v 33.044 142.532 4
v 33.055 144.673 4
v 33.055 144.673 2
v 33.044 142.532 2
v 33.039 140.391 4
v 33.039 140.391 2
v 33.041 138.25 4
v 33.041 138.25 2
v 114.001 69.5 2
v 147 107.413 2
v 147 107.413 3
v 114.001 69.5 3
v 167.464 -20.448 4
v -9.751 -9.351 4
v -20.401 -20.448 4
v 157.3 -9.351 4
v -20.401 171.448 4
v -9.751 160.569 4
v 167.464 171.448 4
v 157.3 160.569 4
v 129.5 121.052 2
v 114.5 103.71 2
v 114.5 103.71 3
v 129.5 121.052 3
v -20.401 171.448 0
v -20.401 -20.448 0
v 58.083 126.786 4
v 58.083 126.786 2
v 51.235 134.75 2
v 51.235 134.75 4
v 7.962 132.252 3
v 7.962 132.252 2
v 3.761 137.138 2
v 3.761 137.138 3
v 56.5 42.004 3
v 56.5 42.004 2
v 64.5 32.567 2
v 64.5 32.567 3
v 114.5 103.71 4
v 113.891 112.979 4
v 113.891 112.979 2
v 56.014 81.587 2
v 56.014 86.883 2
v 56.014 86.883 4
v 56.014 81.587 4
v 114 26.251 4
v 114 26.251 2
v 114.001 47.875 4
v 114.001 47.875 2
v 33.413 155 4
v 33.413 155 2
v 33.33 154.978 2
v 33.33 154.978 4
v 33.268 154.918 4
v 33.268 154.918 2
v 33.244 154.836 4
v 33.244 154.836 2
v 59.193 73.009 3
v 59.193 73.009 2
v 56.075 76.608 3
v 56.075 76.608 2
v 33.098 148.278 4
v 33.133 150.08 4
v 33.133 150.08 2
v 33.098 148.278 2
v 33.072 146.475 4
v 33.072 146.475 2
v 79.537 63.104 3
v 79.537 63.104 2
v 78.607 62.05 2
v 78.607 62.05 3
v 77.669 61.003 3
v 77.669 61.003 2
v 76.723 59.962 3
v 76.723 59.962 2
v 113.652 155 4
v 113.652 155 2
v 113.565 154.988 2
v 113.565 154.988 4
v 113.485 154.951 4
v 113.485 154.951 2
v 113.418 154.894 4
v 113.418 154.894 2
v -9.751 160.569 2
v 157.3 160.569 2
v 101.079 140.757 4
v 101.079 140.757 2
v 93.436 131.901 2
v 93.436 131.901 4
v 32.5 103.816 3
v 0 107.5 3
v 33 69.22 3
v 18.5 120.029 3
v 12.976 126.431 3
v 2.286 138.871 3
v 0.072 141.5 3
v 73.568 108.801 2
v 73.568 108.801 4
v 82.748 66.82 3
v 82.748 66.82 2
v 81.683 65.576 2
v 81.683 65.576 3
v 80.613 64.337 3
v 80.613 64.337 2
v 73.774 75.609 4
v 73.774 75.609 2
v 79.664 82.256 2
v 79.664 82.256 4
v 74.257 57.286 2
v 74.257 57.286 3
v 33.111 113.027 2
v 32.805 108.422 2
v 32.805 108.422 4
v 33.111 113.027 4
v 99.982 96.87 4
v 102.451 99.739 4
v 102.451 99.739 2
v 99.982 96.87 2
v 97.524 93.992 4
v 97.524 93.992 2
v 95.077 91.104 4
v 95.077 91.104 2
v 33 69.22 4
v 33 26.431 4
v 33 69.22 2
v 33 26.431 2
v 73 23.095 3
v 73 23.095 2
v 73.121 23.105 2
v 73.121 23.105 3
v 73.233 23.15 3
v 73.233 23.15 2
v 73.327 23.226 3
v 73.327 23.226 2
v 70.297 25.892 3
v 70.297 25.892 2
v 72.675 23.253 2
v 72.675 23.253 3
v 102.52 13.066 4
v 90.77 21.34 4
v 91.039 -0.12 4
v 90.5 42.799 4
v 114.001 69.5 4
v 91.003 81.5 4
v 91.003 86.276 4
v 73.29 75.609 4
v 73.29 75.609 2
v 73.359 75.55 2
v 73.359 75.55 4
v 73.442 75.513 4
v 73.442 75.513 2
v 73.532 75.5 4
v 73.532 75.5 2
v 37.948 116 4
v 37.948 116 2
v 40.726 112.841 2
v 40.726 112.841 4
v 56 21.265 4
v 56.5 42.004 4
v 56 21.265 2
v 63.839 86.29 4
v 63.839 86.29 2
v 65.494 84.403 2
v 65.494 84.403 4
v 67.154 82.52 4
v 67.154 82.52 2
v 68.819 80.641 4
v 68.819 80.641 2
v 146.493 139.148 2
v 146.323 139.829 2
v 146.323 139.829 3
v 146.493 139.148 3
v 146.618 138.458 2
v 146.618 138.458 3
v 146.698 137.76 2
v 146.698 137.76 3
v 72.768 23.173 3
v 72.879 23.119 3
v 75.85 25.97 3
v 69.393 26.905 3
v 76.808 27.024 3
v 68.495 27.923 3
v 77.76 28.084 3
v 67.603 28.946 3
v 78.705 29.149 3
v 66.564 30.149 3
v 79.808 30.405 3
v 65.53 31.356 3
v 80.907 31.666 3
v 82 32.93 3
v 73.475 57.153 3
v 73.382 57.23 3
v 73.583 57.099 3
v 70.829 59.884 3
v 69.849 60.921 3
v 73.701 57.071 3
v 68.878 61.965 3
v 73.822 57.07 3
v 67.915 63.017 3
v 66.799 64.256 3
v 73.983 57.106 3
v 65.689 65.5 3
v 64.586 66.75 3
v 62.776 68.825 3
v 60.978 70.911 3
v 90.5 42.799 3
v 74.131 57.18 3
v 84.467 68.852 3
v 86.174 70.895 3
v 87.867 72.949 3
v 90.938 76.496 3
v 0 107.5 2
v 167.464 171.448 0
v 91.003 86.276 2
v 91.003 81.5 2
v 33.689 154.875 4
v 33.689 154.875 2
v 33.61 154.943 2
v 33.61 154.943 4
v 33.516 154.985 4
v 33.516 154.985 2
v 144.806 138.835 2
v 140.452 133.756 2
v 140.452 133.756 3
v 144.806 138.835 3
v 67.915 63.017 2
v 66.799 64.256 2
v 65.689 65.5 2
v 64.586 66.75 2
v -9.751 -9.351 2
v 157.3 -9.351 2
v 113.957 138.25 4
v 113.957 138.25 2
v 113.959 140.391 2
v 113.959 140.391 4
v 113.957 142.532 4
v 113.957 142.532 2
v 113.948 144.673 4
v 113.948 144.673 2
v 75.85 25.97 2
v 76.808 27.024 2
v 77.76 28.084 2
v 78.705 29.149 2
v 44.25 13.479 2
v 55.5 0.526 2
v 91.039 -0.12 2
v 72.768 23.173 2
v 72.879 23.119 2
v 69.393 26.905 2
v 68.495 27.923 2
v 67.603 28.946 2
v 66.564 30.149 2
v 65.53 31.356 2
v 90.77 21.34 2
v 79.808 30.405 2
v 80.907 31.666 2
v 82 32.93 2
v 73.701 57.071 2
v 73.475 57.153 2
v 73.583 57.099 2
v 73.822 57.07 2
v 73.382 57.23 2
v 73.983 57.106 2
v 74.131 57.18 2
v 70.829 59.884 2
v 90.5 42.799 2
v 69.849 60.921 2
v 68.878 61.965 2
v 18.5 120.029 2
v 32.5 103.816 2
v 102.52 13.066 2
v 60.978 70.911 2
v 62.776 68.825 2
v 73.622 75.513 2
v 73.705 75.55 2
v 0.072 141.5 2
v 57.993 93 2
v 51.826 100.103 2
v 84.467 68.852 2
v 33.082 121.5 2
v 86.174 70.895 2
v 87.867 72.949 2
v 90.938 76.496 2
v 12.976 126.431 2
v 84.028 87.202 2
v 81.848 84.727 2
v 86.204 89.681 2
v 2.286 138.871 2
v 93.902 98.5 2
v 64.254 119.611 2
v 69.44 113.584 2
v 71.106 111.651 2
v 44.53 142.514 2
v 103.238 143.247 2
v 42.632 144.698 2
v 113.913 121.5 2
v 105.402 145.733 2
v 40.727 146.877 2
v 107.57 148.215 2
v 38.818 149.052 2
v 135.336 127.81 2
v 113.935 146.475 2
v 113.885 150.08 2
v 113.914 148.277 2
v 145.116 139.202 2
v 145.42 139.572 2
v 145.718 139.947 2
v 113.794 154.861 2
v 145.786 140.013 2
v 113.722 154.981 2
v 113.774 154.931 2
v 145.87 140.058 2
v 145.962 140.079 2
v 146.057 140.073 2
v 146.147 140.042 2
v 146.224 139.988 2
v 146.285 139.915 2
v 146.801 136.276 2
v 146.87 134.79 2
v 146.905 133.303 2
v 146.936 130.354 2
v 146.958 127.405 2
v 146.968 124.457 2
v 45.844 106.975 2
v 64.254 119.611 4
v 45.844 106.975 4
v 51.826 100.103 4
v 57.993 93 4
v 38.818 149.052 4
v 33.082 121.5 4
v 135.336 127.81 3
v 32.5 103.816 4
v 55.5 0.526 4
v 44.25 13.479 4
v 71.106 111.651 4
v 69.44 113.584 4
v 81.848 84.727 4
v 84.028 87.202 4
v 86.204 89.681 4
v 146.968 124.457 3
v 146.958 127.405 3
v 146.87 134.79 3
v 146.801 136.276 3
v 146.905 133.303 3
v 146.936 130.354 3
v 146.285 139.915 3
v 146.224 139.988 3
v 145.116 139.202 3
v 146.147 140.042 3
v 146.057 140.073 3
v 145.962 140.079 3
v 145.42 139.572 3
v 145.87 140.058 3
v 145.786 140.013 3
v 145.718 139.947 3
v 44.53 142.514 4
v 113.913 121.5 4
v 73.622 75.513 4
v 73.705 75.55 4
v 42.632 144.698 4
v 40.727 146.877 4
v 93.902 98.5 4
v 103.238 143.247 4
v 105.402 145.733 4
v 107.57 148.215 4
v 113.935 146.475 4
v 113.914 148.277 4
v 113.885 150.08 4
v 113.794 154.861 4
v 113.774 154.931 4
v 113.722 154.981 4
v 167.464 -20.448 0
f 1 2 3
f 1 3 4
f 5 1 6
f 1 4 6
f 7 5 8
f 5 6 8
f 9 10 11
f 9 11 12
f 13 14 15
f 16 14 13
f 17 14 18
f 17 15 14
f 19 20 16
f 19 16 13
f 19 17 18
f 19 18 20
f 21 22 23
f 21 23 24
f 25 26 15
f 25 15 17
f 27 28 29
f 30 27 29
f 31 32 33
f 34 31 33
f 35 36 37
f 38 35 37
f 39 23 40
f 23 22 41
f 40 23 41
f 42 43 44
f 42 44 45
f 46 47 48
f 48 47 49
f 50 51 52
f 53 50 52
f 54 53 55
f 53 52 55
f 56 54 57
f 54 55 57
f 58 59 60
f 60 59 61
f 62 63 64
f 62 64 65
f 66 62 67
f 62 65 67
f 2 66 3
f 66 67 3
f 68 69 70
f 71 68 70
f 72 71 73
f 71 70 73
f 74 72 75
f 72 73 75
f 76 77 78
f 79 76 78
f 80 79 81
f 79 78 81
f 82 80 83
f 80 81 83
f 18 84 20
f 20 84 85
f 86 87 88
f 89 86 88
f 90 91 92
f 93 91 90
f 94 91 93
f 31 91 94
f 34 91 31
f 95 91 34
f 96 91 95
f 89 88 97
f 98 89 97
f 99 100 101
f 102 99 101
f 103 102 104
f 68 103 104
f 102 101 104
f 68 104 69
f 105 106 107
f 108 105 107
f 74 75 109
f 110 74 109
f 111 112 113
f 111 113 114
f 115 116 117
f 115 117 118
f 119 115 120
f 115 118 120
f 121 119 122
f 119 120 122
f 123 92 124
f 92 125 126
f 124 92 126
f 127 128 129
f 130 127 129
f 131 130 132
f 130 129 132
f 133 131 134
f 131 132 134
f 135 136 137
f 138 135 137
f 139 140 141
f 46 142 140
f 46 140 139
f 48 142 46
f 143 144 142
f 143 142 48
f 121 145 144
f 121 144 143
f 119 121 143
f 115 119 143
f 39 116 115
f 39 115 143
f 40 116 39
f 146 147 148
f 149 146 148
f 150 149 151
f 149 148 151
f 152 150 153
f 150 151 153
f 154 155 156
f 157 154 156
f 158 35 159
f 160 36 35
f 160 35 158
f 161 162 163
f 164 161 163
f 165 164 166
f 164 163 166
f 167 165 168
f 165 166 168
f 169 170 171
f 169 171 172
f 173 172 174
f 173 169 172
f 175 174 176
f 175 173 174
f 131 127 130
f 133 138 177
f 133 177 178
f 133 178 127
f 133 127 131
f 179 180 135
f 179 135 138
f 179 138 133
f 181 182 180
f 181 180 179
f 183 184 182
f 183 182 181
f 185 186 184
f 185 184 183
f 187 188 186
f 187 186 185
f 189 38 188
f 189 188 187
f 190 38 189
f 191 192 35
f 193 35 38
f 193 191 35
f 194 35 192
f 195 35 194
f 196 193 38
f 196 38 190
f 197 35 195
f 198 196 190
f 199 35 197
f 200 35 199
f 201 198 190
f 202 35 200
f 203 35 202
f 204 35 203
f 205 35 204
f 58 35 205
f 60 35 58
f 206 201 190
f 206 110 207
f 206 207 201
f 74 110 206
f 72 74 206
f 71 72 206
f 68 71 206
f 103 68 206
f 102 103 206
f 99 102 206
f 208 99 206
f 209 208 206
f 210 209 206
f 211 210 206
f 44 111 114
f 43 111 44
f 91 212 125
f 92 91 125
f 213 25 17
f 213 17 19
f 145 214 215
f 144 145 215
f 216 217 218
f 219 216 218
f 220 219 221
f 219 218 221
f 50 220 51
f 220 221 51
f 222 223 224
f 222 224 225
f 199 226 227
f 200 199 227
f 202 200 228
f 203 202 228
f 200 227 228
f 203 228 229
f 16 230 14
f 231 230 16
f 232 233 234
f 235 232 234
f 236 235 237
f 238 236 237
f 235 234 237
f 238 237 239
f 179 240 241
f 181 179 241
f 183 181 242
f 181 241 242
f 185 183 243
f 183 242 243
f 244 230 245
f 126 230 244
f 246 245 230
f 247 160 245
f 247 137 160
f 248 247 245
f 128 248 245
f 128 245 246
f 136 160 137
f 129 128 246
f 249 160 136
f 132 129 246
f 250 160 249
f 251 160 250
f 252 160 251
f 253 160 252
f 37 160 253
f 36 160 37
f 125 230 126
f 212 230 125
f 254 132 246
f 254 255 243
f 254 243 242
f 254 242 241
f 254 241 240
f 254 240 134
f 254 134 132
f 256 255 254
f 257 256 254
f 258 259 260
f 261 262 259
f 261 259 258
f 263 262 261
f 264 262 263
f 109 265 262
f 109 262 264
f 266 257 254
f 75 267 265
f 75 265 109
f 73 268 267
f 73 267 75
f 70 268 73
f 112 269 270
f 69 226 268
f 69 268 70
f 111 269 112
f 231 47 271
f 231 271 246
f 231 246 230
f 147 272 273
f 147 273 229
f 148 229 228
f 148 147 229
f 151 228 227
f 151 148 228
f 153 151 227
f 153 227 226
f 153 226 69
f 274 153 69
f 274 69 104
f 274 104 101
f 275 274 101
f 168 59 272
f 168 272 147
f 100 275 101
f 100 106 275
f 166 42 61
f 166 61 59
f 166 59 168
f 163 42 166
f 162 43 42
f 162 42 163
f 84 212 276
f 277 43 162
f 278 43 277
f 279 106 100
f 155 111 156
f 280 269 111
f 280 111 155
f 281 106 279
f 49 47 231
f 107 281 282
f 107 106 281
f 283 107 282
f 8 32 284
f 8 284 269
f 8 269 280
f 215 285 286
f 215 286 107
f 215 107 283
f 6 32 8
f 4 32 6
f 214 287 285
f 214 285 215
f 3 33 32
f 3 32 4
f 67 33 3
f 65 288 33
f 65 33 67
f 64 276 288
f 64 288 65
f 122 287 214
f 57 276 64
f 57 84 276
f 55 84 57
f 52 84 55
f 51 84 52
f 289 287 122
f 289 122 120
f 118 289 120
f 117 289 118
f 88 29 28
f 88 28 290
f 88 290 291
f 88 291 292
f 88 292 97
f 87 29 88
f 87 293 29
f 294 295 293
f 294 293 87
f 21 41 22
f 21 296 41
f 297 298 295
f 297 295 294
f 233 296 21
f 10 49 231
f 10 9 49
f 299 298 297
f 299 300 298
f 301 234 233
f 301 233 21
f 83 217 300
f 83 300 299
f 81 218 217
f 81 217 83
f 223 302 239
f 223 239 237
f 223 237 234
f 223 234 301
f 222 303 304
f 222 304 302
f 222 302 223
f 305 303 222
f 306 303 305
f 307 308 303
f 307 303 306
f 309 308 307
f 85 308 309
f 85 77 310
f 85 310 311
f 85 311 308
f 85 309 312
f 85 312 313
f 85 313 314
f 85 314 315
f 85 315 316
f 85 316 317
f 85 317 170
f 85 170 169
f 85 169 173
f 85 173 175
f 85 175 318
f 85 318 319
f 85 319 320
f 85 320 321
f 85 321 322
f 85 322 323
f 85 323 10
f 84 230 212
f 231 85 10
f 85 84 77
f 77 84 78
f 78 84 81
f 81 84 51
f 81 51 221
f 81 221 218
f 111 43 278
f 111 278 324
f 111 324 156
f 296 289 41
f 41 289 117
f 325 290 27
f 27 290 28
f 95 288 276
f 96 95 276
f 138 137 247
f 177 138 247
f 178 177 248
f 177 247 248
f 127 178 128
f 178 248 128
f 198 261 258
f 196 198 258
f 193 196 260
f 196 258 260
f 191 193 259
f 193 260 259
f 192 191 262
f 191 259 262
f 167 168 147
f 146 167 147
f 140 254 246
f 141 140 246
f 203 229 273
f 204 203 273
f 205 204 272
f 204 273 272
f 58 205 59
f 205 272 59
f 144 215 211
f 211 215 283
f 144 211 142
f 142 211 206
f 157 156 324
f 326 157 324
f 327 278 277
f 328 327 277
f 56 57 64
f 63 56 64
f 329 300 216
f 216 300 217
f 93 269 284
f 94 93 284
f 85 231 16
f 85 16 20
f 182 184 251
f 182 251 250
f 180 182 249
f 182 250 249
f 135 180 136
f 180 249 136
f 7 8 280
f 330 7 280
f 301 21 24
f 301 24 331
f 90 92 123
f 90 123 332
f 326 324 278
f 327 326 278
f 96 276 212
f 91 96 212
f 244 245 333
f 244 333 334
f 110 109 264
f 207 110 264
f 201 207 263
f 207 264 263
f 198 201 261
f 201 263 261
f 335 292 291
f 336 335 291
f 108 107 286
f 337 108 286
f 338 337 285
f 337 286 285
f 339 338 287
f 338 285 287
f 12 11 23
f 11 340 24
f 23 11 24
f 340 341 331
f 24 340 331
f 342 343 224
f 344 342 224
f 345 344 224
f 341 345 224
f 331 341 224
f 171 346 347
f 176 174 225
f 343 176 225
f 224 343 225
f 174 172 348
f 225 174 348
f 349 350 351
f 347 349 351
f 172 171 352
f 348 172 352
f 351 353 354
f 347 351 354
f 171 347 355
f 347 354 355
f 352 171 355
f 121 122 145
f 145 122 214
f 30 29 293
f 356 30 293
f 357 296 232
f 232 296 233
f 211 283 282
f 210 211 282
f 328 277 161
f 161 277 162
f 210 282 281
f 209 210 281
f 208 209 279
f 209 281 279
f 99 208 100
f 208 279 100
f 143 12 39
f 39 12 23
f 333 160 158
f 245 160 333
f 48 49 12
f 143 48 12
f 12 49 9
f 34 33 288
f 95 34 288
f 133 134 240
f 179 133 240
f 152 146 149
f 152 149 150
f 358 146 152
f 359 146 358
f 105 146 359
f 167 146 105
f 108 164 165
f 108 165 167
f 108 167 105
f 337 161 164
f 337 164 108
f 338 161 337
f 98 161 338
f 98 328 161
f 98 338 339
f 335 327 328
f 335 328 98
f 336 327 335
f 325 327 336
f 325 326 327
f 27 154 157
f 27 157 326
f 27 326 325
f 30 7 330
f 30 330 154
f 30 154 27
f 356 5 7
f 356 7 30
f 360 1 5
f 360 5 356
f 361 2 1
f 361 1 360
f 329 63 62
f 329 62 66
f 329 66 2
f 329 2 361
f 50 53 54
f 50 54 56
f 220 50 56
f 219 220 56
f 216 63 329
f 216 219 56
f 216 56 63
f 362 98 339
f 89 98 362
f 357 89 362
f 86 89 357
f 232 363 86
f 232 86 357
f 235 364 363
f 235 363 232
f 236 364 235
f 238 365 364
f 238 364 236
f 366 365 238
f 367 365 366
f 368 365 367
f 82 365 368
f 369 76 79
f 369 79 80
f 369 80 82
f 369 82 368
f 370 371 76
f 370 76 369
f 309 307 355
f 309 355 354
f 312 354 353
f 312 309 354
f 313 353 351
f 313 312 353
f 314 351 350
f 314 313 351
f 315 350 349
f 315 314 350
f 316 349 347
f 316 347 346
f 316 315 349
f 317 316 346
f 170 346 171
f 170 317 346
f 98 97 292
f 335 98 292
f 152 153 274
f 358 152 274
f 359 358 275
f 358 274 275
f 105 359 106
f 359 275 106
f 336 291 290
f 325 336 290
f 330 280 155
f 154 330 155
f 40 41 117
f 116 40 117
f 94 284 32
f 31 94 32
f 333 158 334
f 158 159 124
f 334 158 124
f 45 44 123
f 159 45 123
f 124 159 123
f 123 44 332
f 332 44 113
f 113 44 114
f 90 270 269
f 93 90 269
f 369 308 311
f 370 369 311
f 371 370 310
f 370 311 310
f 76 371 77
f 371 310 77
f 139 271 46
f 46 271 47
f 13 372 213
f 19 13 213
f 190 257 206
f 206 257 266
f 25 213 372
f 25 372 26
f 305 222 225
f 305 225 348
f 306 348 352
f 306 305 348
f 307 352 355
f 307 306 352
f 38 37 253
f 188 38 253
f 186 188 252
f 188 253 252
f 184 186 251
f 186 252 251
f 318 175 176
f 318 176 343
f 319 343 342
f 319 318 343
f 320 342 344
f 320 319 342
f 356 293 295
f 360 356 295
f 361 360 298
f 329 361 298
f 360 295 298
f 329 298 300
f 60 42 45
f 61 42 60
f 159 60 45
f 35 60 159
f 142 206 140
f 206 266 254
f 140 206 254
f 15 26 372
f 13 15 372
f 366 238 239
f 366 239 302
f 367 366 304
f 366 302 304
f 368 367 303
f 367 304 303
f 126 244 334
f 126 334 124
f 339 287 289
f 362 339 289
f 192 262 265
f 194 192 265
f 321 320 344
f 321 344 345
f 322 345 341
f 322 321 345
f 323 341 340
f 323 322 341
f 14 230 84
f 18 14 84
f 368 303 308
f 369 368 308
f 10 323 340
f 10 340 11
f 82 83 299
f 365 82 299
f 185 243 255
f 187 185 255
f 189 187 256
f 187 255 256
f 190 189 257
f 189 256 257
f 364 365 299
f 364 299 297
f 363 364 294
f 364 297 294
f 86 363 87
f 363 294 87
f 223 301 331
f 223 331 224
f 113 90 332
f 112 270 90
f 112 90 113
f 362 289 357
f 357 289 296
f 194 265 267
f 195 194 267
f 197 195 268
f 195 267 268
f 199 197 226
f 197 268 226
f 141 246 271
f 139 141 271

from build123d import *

# Parameters (mm, degrees)
MODEL_W                 = 187.865079392
MODEL_H                 = 191.895039876
MODEL_W_2               = 167.051581688
MODEL_H_2               = 169.92041531
SALIENTE_EXTRUIR1_DEPTH = 4
MODEL_3_W               = 167.051581688
MODEL_3_H               = 169.92041531
SALIENTE_EXTRUIR2_DEPTH = 2
SALIENTE_EXTRUIR3_DEPTH = 4
SALIENTE_EXTRUIR4_DEPTH = 3


with BuildPart() as part:
    # Model → Saliente-Extruir1 (new body)
    with BuildSketch(Plane.XY):
        with Locations((73.531542, 75.5)):
            Rectangle(MODEL_W, MODEL_H)
        with Locations((73.774397, 75.60926)):
            Rectangle(MODEL_W_2, MODEL_H_2, mode=Mode.SUBTRACT)
    extrude(amount=SALIENTE_EXTRUIR1_DEPTH)

    # Model<3> → Saliente-Extruir2 (add)
    with BuildSketch(Plane.XY):
        with Locations((73.774397, 75.60926)):
            Rectangle(MODEL_3_W, MODEL_3_H)
        with BuildLine():
            Line((7.2e-05, 107.5), (0.035999, 124.5))
            Line((0.035999, 124.5), (0.071926, 141.5))
            Line((0.071926, 141.5), (2.285963, 138.871272))
            Line((2.285963, 138.871272), (3.760669, 137.137865))
            Line((3.760669, 137.137865), (7.962127, 132.252038))
            Line((7.962127, 132.252038), (12.976309, 126.430829))
            Line((12.976309, 126.430829), (18.5, 120.029115))
            Line((18.5, 120.029115), (32.5, 103.815685))
            Line((32.5, 103.815685), (32.80535, 108.421532))
            Line((32.80535, 108.421532), (33.110701, 113.027379))
            Line((33.110701, 113.027379), (56.014045, 86.882719623))
            Line((56.014045, 86.882719623), (56.014045, 81.586526))
            Line((56.014045, 81.586526), (56.075171593, 76.607524733))
            Line((56.075171593, 76.607524733), (59.193446, 73.008717))
            ThreePointArc((59.193446, 73.008717), (61.875260227, 69.866972201), (64.585827, 66.75))
            ThreePointArc((64.585827, 66.75), (66.243062882, 64.877065991), (67.915255, 63.017473))
            ThreePointArc((67.915255, 63.017473), (69.362114385, 61.441684708), (70.828956, 59.88448))
            Line((70.828956, 59.88448), (73.38197, 57.22976))
            ThreePointArc((73.38197, 57.22976), (73.583472519, 57.099124116), (73.821783, 57.069508))
            ThreePointArc((73.821783, 57.069508), (74.059199996, 57.138361311), (74.257102, 57.286491))
            Line((74.257102, 57.286491), (76.723497, 59.962242))
            ThreePointArc((76.723497, 59.962242), (78.138911281, 61.525374547), (79.537207, 63.103839))
            ThreePointArc((79.537207, 63.103839), (81.148823539, 64.956113153), (82.747569, 66.819508))
            ThreePointArc((82.747569, 66.819508), (85.322470724, 69.871815466), (87.86746, 72.949108))
            Line((87.86746, 72.949108), (90.938203107, 76.495855987))
            Line((90.938203107, 76.495855987), (91.003279, 81.5))
            Line((91.003279, 81.5), (91.003279, 86.276217564))
            Line((91.003279, 86.276217564), (95.077112, 91.103725))
            ThreePointArc((95.077112, 91.103725), (98.751620148, 95.432315079), (102.451353, 99.739365))
            Line((102.451353, 99.739365), (113.891286, 112.97873))
            Line((113.891286, 112.97873), (114.195643, 108.344383))
            Line((114.195643, 108.344383), (114.5, 103.710036))
            Line((114.5, 103.710036), (129.5, 121.052263))
            Line((129.5, 121.052263), (135.336044, 127.810066))
            Line((135.336044, 127.810066), (140.451595, 133.756333))
            Line((140.451595, 133.756333), (144.806497, 138.835291))
            ThreePointArc((144.806497, 138.835291), (145.268329868, 139.386362598), (145.718197, 139.947245))
            ThreePointArc((145.718197, 139.947245), (146.056902292, 140.073181551), (146.32298, 139.828674))
            ThreePointArc((146.32298, 139.828674), (146.561505098, 138.803778786), (146.697812, 137.760359))
            ThreePointArc((146.697812, 137.760359), (146.839403633, 135.533225879), (146.905079, 133.302563))
            ThreePointArc((146.905079, 133.302563), (146.948292555, 128.879665158), (146.968197, 124.456601))
            Line((146.968197, 124.456601), (147, 107.413202))
            Line((147, 107.413202), (130.500632, 88.456601))
            Line((130.500632, 88.456601), (114.001264, 69.5))
            Line((114.001264, 69.5), (114.000632, 47.875318))
            Line((114.000632, 47.875318), (114, 26.250637))
            Line((114, 26.250637), (102.519669, 13.065559))
            Line((102.519669, 13.065559), (91.039338, -0.119518))
            Line((91.039338, -0.119518), (90.769669, 21.339906))
            Line((90.769669, 21.339906), (90.5, 42.799331))
            Line((90.5, 42.799331), (82, 32.93022))
            ThreePointArc((82, 32.93022), (80.35813032, 31.034967776), (78.70536, 29.149214))
            ThreePointArc((78.70536, 29.149214), (77.285058443, 27.553090209), (75.85, 25.970221))
            Line((75.85, 25.970221), (73.32744, 23.22557))
            ThreePointArc((73.32744, 23.22557), (73.178514606, 23.123260258), (73, 23.095357))
            ThreePointArc((73, 23.095357), (72.8221346, 23.142689469), (72.674888, 23.25312))
            Line((72.674888, 23.25312), (70.296875, 25.89166))
            ThreePointArc((70.296875, 25.89166), (68.943226003, 27.413217252), (67.602841, 28.946472))
            ThreePointArc((67.602841, 28.946472), (66.046502566, 30.752317291), (64.5, 32.566593))
            Line((64.5, 32.566593), (56.5, 42.003581))
            Line((56.5, 42.003581), (56, 21.264818))
            Line((56, 21.264818), (55.5, 0.526056))
            Line((55.5, 0.526056), (44.25, 13.478546))
            Line((44.25, 13.478546), (33, 26.431037))
            Line((33, 26.431037), (33, 47.825406))
            Line((33, 47.825406), (33, 69.219776))
            Line((33, 69.219776), (16.500036, 88.359888))
            Line((16.500036, 88.359888), (7.2e-05, 107.5))
        make_face(mode=Mode.SUBTRACT)
        with BuildLine():
            Line((33.081557, 121.5), (33.040779, 138.25))
            ThreePointArc((33.040779, 138.25), (33.040372412, 141.461401183), (33.054796, 144.67277))
            ThreePointArc((33.054796, 144.67277), (33.083588886, 147.376379875), (33.133193, 150.079688))
            Line((33.133193, 150.079688), (33.244463, 154.835902))
            ThreePointArc((33.244463, 154.835902), (33.295158013, 154.952178847), (33.412646, 155))
            ThreePointArc((33.412646, 155), (33.564379261, 154.967326432), (33.689217, 154.875098))
            Line((33.689217, 154.875098), (38.818235, 149.051562))
            ThreePointArc((38.818235, 149.051562), (41.680167001, 145.787991937), (44.530312, 142.514123))
            Line((44.530312, 142.514123), (51.235194, 134.75))
            Line((51.235194, 134.75), (58.083392, 126.785627))
            Line((58.083392, 126.785627), (64.253973, 119.611402))
            Line((64.253973, 119.611402), (69.439973, 113.58357))
            Line((69.439973, 113.58357), (71.106496, 111.650516))
            Line((71.106496, 111.650516), (73.567895, 108.801033))
            Line((73.567895, 108.801033), (93.436062, 131.900516))
            Line((93.436062, 131.900516), (101.079, 140.757394))
            ThreePointArc((101.079, 140.757394), (104.319587907, 144.490299831), (107.570146, 148.214527))
            Line((107.570146, 148.214527), (113.417907, 154.893792))
            ThreePointArc((113.417907, 154.893792), (113.52353223, 154.97220757), (113.652114, 155))
            ThreePointArc((113.652114, 155), (113.751521904, 154.959401446), (113.794088, 154.86082))
            Line((113.794088, 154.86082), (113.88506, 150.079688))
            ThreePointArc((113.88506, 150.079688), (113.925426412, 147.376336544), (113.948242, 144.67278))
            ThreePointArc((113.948242, 144.67278), (113.958670365, 141.461398132), (113.9566, 138.25))
            Line((113.9566, 138.25), (113.9132, 121.5))
            Line((113.9132, 121.5), (93.902354, 98.5))
            Line((93.902354, 98.5), (86.203861, 89.681292))
            ThreePointArc((86.203861, 89.681292), (82.939012216, 85.964274814), (79.663954, 82.25625))
            Line((79.663954, 82.25625), (73.774397, 75.60926))
            ThreePointArc((73.774397, 75.60926), (73.664692606, 75.528572751), (73.531542, 75.5))
            ThreePointArc((73.531542, 75.5), (73.399066228, 75.528375147), (73.289835, 75.608522))
            Line((73.289835, 75.608522), (68.818749, 80.640625))
            ThreePointArc((68.818749, 80.640625), (66.32370187, 83.460951158), (63.838858, 86.290271))
            Line((63.838858, 86.290271), (57.993476, 93))
            Line((57.993476, 93), (51.825624, 100.103214))
            Line((51.825624, 100.103214), (45.844288, 106.975))
            Line((45.844288, 106.975), (40.726176, 112.840706))
            Line((40.726176, 112.840706), (37.948467, 116))
            Line((37.948467, 116), (33.081557, 121.5))
        make_face(mode=Mode.SUBTRACT)
    extrude(amount=SALIENTE_EXTRUIR2_DEPTH)

    # Model<4> → Saliente-Extruir3 (add)
    with BuildSketch(Plane.XY):
        with BuildLine():
            ThreePointArc((33.054796, 144.67277), (33.040372412, 141.461401183), (33.040779, 138.25))
            Line((33.040779, 138.25), (33.081557, 121.5))
            Line((33.081557, 121.5), (37.948467, 116))
            Line((37.948467, 116), (40.726176, 112.840706))
            Line((40.726176, 112.840706), (45.844288, 106.975))
            Line((45.844288, 106.975), (51.825624, 100.103214))
            Line((51.825624, 100.103214), (57.993476, 93))
            Line((57.993476, 93), (63.838858, 86.290271))
            ThreePointArc((63.838858, 86.290271), (66.32370187, 83.460951158), (68.818749, 80.640625))
            Line((68.818749, 80.640625), (73.289835, 75.608522))
            ThreePointArc((73.289835, 75.608522), (73.399066228, 75.528375147), (73.531542, 75.5))
            ThreePointArc((73.531542, 75.5), (73.664692606, 75.528572751), (73.774397, 75.60926))
            Line((73.774397, 75.60926), (79.663954, 82.25625))
            ThreePointArc((79.663954, 82.25625), (82.939012216, 85.964274814), (86.203861, 89.681292))
            Line((86.203861, 89.681292), (93.902354, 98.5))
            Line((93.902354, 98.5), (113.9132, 121.5))
            Line((113.9132, 121.5), (113.9566, 138.25))
            ThreePointArc((113.9566, 138.25), (113.958670365, 141.461398132), (113.948242, 144.67278))
            ThreePointArc((113.948242, 144.67278), (113.925426412, 147.376336544), (113.88506, 150.079688))
            Line((113.88506, 150.079688), (113.794088, 154.86082))
            ThreePointArc((113.794088, 154.86082), (113.751521904, 154.959401446), (113.652114, 155))
            ThreePointArc((113.652114, 155), (113.52353223, 154.97220757), (113.417907, 154.893792))
            Line((113.417907, 154.893792), (107.570146, 148.214527))
            ThreePointArc((107.570146, 148.214527), (104.319587907, 144.490299831), (101.079, 140.757394))
            Line((101.079, 140.757394), (93.436062, 131.900516))
            Line((93.436062, 131.900516), (73.567895, 108.801033))
            Line((73.567895, 108.801033), (71.106496, 111.650516))
            Line((71.106496, 111.650516), (69.439973, 113.58357))
            Line((69.439973, 113.58357), (64.253973, 119.611402))
            Line((64.253973, 119.611402), (58.083392, 126.785627))
            Line((58.083392, 126.785627), (51.235194, 134.75))
            Line((51.235194, 134.75), (44.530312, 142.514123))
            ThreePointArc((44.530312, 142.514123), (41.680167001, 145.787991937), (38.818235, 149.051562))
            Line((38.818235, 149.051562), (33.689217, 154.875098))
            ThreePointArc((33.689217, 154.875098), (33.564379261, 154.967326432), (33.412646, 155))
            ThreePointArc((33.412646, 155), (33.295158013, 154.952178847), (33.244463, 154.835902))
            Line((33.244463, 154.835902), (33.133193, 150.079688))
            ThreePointArc((33.133193, 150.079688), (33.083588886, 147.376379875), (33.054796, 144.67277))
        make_face()
        Polygon((32.5, 103.815685), (33, 69.219776), (33, 26.431037), (44.25, 13.478546), (55.5, 0.526056), (56, 21.264818), (56.5, 42.003581), (56.014045, 81.586526), (56.014045, 86.882719623), (33.110701, 113.027379), (32.80535, 108.421532), align=None)
        with BuildLine():
            Line((91.003279, 81.5), (90.5, 42.799331))
            Line((90.5, 42.799331), (90.769669, 21.339906))
            Line((90.769669, 21.339906), (91.039338, -0.119518))
            Line((91.039338, -0.119518), (102.519669, 13.065559))
            Line((102.519669, 13.065559), (114, 26.250637))
            Line((114, 26.250637), (114.000632, 47.875318))
            Line((114.000632, 47.875318), (114.001264, 69.5))
            Line((114.001264, 69.5), (114.5, 103.710036))
            Line((114.5, 103.710036), (113.891286, 112.97873))
            Line((113.891286, 112.97873), (102.451353, 99.739365))
            ThreePointArc((102.451353, 99.739365), (98.751620148, 95.432315079), (95.077112, 91.103725))
            Line((95.077112, 91.103725), (91.003279, 86.276217564))
            Line((91.003279, 86.276217564), (91.003279, 81.5))
        make_face()
    extrude(amount=SALIENTE_EXTRUIR3_DEPTH)

    # Model<5> → Saliente-Extruir4 (add)
    with BuildSketch(Plane.XY):
        Polygon((0.071926, 141.5), (7.2e-05, 107.5), (33, 69.219776), (32.5, 103.815685), (18.5, 120.029115), (12.976309, 126.430829), (7.962127, 132.252038), (3.760669, 137.137865), (2.285963, 138.871272), align=None)
        with BuildLine():
            Line((56.075171593, 76.607524733), (56.5, 42.003581))
            Line((56.5, 42.003581), (64.5, 32.566593))
            ThreePointArc((64.5, 32.566593), (66.046502566, 30.752317291), (67.602841, 28.946472))
            ThreePointArc((67.602841, 28.946472), (68.943226003, 27.413217252), (70.296875, 25.89166))
            Line((70.296875, 25.89166), (72.674888, 23.25312))
            ThreePointArc((72.674888, 23.25312), (72.8221346, 23.142689469), (73, 23.095357))
            ThreePointArc((73, 23.095357), (73.178514606, 23.123260258), (73.32744, 23.22557))
            Line((73.32744, 23.22557), (75.85, 25.970221))
            ThreePointArc((75.85, 25.970221), (77.285058443, 27.553090209), (78.70536, 29.149214))
            ThreePointArc((78.70536, 29.149214), (80.35813032, 31.034967776), (82, 32.93022))
            Line((82, 32.93022), (90.5, 42.799331))
            Line((90.5, 42.799331), (90.938203107, 76.495855987))
            Line((90.938203107, 76.495855987), (87.86746, 72.949108))
            ThreePointArc((87.86746, 72.949108), (85.322470724, 69.871815466), (82.747569, 66.819508))
            ThreePointArc((82.747569, 66.819508), (81.148823539, 64.956113153), (79.537207, 63.103839))
            ThreePointArc((79.537207, 63.103839), (78.138911281, 61.525374547), (76.723497, 59.962242))
            Line((76.723497, 59.962242), (74.257102, 57.286491))
            ThreePointArc((74.257102, 57.286491), (74.059199996, 57.138361311), (73.821783, 57.069508))
            ThreePointArc((73.821783, 57.069508), (73.583472519, 57.099124116), (73.38197, 57.22976))
            Line((73.38197, 57.22976), (70.828956, 59.88448))
            ThreePointArc((70.828956, 59.88448), (69.362114385, 61.441684708), (67.915255, 63.017473))
            ThreePointArc((67.915255, 63.017473), (66.243062882, 64.877065991), (64.585827, 66.75))
            ThreePointArc((64.585827, 66.75), (61.875260227, 69.866972201), (59.193446, 73.008717))
            Line((59.193446, 73.008717), (56.075171593, 76.607524733))
        make_face()
        with BuildLine():
            Line((114.5, 103.710036), (114.001264, 69.5))
            Line((114.001264, 69.5), (147, 107.413202))
            Line((147, 107.413202), (146.968197, 124.456601))
            ThreePointArc((146.968197, 124.456601), (146.948292555, 128.879665158), (146.905079, 133.302563))
            ThreePointArc((146.905079, 133.302563), (146.839403633, 135.533225879), (146.697812, 137.760359))
            ThreePointArc((146.697812, 137.760359), (146.561505098, 138.803778786), (146.32298, 139.828674))
            ThreePointArc((146.32298, 139.828674), (146.056902292, 140.073181551), (145.718197, 139.947245))
            ThreePointArc((145.718197, 139.947245), (145.268329868, 139.386362598), (144.806497, 138.835291))
            Line((144.806497, 138.835291), (140.451595, 133.756333))
            Line((140.451595, 133.756333), (135.336044, 127.810066))
            Line((135.336044, 127.810066), (129.5, 121.052263))
            Line((129.5, 121.052263), (114.5, 103.710036))
        make_face()
    extrude(amount=SALIENTE_EXTRUIR4_DEPTH)


solid = part.part
